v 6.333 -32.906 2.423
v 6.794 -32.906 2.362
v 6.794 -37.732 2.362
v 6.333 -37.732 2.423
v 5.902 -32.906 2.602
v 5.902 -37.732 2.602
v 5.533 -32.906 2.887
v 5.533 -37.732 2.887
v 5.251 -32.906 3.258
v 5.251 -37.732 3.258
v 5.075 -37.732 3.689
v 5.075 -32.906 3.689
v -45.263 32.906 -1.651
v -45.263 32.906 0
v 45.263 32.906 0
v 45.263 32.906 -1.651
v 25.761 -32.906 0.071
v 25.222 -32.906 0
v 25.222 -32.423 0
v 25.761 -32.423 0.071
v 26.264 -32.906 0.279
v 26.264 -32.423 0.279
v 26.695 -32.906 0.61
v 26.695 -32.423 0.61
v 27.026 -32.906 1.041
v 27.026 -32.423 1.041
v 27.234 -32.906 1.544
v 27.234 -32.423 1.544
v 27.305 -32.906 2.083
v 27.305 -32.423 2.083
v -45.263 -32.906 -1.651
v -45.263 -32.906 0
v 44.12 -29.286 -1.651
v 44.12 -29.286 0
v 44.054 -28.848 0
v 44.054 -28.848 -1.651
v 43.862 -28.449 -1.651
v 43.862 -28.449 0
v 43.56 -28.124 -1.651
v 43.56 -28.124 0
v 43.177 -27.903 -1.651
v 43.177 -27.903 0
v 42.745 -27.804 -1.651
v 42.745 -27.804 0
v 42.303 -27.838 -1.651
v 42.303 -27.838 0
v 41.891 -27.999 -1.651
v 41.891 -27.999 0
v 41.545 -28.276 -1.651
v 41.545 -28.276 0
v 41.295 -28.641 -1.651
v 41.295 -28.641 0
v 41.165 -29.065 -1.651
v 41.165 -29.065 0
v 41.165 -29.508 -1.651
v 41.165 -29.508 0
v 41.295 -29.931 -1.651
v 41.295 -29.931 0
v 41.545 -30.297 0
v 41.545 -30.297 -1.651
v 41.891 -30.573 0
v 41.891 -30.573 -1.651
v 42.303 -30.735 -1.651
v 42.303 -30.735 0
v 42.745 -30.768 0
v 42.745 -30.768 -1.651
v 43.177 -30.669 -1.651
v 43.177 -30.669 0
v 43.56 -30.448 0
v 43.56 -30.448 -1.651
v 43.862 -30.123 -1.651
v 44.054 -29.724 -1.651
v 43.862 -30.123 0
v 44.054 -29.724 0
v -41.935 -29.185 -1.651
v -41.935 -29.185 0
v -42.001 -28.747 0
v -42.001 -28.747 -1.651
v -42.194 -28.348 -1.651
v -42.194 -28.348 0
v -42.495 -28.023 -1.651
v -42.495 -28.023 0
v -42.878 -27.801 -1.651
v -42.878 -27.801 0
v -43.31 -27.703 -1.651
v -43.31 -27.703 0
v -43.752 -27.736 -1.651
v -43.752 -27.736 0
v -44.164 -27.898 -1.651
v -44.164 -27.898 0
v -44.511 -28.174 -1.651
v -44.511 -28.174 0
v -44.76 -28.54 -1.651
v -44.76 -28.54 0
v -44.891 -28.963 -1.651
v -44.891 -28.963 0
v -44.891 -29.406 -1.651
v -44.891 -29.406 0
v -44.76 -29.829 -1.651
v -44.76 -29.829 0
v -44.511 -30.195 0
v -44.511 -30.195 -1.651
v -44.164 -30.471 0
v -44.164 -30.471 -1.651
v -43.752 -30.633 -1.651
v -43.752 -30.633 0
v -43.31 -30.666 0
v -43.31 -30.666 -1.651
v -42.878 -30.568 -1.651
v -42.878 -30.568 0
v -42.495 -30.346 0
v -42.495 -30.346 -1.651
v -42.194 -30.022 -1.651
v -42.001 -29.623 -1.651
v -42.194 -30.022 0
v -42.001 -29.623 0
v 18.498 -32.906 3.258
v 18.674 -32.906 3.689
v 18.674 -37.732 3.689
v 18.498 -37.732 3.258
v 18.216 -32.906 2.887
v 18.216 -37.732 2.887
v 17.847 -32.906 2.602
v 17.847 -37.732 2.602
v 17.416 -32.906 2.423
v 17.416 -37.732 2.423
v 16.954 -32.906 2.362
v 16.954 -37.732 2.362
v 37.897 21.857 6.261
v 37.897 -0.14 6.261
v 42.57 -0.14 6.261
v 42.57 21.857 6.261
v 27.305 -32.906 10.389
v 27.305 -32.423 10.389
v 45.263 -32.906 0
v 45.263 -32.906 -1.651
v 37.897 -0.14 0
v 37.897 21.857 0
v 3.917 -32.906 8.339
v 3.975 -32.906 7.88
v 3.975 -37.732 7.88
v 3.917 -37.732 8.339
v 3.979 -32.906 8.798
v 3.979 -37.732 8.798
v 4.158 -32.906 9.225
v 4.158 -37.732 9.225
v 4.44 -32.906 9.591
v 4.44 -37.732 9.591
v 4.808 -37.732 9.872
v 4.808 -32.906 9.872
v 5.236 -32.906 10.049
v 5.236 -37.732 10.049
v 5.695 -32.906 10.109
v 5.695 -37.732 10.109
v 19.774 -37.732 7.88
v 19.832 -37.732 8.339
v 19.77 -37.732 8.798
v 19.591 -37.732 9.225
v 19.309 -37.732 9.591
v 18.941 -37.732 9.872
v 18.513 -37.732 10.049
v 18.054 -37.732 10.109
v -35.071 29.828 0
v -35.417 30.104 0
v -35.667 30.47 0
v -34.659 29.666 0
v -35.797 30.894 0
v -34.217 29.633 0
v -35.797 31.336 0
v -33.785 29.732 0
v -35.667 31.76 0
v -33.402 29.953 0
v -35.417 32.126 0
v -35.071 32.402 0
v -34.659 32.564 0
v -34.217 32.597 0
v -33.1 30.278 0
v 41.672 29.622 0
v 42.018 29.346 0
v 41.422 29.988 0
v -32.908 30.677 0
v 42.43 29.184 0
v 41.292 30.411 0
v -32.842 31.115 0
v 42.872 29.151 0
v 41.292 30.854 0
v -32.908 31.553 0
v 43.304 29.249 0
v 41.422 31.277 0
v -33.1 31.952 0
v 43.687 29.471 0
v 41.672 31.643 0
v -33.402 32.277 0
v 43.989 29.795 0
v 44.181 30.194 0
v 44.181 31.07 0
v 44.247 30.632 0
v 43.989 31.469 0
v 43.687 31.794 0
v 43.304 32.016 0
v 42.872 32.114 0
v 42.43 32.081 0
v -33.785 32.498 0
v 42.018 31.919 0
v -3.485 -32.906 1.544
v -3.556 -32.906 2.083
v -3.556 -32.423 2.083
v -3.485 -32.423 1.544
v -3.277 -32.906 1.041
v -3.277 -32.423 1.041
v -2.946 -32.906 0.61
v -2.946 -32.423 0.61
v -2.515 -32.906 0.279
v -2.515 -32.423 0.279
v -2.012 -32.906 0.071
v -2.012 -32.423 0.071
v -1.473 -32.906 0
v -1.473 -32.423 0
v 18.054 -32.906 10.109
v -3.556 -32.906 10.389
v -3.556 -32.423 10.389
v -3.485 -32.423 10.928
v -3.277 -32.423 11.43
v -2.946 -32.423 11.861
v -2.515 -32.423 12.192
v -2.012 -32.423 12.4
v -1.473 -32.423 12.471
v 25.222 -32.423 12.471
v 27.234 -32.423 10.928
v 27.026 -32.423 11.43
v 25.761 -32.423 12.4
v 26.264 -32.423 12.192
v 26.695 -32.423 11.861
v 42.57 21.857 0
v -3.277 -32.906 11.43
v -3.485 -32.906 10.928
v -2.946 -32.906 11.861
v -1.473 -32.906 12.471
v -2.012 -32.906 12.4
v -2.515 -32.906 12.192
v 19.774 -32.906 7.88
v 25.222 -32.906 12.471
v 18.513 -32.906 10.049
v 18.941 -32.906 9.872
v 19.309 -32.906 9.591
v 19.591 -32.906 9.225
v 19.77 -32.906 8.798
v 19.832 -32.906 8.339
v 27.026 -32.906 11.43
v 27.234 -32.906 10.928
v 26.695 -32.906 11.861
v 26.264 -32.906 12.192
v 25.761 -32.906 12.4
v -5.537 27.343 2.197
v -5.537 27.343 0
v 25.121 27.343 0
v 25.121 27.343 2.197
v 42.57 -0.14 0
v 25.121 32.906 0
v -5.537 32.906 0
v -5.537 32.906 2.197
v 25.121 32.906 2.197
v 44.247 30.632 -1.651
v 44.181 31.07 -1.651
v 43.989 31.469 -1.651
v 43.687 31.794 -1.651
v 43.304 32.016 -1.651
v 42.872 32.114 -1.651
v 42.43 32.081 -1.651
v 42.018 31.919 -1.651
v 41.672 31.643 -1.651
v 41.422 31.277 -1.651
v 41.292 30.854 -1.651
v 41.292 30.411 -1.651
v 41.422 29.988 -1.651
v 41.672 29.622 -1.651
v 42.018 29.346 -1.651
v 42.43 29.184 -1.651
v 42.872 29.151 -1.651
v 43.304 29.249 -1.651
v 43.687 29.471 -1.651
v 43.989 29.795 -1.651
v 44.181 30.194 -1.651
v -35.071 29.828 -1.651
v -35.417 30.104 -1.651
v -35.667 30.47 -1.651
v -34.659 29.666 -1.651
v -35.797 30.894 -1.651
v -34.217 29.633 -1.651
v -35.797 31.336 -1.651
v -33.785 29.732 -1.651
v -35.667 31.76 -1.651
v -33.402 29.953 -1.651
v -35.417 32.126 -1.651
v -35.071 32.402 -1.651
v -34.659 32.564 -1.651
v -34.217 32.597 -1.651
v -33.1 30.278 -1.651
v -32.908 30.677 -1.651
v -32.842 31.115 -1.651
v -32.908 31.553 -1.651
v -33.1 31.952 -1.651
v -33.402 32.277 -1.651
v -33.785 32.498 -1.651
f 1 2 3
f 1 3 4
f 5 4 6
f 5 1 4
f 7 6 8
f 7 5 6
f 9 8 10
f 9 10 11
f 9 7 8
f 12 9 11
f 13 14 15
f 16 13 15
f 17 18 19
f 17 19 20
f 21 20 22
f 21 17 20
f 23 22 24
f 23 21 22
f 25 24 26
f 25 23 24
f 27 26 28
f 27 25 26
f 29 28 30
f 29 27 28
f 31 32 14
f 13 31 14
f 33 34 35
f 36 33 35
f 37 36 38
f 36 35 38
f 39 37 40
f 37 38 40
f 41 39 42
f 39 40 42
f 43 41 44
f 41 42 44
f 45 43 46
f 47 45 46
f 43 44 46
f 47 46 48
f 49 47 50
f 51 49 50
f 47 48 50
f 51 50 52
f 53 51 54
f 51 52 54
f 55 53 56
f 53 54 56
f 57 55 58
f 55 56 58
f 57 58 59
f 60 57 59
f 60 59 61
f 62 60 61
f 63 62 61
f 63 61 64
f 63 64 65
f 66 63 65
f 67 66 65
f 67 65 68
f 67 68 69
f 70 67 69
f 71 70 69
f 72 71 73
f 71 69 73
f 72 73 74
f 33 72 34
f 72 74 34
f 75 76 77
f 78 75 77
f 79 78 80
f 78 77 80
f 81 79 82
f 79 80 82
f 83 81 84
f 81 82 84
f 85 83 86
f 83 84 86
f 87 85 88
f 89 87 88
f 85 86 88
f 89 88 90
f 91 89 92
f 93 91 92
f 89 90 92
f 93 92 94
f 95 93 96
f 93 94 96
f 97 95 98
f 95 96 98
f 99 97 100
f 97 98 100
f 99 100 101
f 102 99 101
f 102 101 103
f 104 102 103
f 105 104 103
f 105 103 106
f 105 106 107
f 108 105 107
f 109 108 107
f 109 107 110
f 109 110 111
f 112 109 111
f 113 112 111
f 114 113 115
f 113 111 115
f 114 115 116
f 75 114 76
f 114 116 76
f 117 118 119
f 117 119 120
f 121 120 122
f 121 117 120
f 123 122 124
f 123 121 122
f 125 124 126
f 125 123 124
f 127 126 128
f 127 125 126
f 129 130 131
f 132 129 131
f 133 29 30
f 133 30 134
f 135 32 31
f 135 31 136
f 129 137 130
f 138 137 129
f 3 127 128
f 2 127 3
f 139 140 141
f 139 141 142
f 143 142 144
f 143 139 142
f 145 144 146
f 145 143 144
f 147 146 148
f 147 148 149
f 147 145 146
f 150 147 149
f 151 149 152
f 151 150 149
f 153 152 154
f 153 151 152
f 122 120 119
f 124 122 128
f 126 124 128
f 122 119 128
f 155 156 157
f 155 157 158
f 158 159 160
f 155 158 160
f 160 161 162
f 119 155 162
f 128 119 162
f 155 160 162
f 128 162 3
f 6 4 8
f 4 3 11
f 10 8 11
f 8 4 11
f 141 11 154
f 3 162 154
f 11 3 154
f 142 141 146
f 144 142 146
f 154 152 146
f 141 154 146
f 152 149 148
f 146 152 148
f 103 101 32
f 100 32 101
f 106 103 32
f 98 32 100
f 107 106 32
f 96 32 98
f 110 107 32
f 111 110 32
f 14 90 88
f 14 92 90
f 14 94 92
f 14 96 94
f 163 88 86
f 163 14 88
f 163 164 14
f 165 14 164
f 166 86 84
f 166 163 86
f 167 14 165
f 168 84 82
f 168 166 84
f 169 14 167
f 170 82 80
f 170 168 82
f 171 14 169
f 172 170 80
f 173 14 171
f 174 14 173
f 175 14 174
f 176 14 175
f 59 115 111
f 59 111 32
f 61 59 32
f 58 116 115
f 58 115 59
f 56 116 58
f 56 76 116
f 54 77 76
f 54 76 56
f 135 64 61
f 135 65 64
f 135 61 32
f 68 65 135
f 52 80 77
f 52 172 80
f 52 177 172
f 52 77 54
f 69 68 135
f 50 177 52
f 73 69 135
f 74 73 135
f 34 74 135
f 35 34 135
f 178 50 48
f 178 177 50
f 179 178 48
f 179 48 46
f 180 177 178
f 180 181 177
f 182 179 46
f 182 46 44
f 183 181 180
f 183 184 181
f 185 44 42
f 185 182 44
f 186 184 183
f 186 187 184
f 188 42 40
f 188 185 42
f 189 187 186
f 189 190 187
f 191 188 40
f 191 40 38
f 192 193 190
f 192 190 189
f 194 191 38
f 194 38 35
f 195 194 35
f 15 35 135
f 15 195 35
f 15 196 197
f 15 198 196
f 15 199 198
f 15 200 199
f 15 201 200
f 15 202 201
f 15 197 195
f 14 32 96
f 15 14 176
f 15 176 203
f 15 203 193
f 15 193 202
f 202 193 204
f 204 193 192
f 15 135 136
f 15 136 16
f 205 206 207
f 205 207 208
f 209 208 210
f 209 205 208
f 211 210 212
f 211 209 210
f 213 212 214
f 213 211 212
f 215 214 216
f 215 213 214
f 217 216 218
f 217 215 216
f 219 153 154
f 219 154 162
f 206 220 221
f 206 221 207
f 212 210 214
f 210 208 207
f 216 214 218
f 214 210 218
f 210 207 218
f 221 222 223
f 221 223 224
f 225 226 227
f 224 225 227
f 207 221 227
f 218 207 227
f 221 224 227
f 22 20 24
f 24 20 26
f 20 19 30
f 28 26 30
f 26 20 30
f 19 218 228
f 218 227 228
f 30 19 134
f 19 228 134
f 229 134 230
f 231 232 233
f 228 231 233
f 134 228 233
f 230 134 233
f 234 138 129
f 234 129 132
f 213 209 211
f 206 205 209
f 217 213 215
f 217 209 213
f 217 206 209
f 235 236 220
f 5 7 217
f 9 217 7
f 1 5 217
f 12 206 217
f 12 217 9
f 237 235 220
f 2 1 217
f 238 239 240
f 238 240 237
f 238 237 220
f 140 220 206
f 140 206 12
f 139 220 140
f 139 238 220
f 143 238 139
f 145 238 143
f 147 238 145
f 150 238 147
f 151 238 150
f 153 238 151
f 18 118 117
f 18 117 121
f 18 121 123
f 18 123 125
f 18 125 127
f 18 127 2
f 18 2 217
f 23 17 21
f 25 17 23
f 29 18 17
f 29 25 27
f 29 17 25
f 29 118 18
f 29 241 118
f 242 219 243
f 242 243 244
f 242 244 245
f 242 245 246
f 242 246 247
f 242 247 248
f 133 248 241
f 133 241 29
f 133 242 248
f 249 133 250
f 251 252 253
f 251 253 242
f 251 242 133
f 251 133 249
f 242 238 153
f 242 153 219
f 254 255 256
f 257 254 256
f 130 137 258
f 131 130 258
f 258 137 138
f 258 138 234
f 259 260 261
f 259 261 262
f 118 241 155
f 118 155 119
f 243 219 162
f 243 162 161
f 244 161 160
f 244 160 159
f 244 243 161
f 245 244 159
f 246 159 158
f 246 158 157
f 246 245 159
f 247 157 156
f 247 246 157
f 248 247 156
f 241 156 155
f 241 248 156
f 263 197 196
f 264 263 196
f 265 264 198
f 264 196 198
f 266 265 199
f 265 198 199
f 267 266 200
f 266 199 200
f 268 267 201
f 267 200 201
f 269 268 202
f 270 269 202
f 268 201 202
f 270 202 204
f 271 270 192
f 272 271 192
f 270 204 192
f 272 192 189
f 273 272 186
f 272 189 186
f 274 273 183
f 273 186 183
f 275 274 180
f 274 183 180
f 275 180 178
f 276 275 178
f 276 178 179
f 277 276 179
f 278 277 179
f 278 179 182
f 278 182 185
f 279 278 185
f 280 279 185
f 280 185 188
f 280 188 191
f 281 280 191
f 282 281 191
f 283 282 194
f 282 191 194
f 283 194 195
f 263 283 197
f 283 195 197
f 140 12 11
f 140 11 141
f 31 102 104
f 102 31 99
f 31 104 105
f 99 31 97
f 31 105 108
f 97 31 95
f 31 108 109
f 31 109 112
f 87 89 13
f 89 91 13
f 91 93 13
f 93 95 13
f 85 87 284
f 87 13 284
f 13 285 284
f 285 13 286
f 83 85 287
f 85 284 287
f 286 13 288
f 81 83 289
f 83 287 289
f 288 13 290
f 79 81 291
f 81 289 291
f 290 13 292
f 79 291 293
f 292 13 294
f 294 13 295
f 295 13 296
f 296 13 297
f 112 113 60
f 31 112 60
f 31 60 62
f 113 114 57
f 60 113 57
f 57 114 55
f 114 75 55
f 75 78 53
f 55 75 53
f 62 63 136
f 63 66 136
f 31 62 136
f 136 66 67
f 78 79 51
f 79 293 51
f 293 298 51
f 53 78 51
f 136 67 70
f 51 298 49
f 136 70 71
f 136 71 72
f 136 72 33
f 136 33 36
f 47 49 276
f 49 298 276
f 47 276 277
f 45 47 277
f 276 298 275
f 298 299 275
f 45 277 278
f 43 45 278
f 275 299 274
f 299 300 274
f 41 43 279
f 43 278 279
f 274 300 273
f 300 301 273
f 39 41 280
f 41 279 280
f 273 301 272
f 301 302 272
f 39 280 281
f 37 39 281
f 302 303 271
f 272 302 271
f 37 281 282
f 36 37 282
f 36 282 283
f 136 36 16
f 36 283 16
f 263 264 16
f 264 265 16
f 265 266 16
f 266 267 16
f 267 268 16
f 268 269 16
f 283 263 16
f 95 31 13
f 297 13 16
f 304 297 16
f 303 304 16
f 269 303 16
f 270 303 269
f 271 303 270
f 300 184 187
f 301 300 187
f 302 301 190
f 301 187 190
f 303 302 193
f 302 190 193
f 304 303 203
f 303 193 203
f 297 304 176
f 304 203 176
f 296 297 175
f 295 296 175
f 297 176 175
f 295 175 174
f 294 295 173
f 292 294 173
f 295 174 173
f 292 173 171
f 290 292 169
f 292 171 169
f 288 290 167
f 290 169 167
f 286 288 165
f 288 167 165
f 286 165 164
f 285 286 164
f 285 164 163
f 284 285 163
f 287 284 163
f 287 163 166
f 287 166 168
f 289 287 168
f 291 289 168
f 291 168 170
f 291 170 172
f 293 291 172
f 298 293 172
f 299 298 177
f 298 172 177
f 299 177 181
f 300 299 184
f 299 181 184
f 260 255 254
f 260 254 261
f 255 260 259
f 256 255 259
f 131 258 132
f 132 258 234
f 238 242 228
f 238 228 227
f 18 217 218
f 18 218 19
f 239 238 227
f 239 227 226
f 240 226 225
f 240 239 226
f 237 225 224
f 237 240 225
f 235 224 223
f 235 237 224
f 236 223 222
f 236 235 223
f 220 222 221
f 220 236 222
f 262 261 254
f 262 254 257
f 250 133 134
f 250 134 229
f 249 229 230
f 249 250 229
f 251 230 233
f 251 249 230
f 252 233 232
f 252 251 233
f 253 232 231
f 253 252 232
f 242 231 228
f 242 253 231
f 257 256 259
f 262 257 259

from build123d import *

# Parameters (mm, degrees)
SKETCH1_W           = 90.5256
SKETCH1_H           = 65.8114
SKETCH1_R           = 1.4859
BOSS_EXTRUDE1_DEPTH = 1.651
BOSS_EXTRUDE2_DEPTH = 0.4826
BOSS_EXTRUDE3_DEPTH = 4.826
SKETCH4_W           = 30.6578
SKETCH4_H           = 5.5626
BOSS_EXTRUDE4_DEPTH = 2.1971
SKETCH5_W           = 4.6736
SKETCH5_H           = 21.9964
BOSS_EXTRUDE5_DEPTH = 6.2611


with BuildPart() as part:
    # Sketch1 → Boss-Extrude1 (new body)
    with BuildSketch(Plane.XY):
        Rectangle(SKETCH1_W, SKETCH1_H)
        with Locations((-34.3281, 31.115)):
            Circle(SKETCH1_R, mode=Mode.SUBTRACT)
        with Locations((-43.4213, -29.1846)):
            Circle(SKETCH1_R, mode=Mode.SUBTRACT)
        with Locations((42.7609, 30.6324)):
            Circle(SKETCH1_R, mode=Mode.SUBTRACT)
        with Locations((42.6339, -29.2862)):
            Circle(SKETCH1_R, mode=Mode.SUBTRACT)
    extrude(amount=-BOSS_EXTRUDE1_DEPTH)


with BuildPart() as body_2:
    # Sketch2 → Boss-Extrude2 (new body)
    with BuildSketch(Plane.XZ.offset(32.9057)):
        with BuildLine():
            Line((-1.4732, 0), (25.2222, 0))
            ThreePointArc((25.2222, 0), (26.694962004, 0.610037996), (27.305, 2.0828))
            Line((27.305, 2.0828), (27.305, 10.3886))
            ThreePointArc((27.305, 10.3886), (26.694962004, 11.861362004), (25.2222, 12.4714))
            Line((25.2222, 12.4714), (-1.4732, 12.4714))
            ThreePointArc((-1.4732, 12.4714), (-2.945962004, 11.861362004), (-3.556, 10.3886))
            Line((-3.556, 10.3886), (-3.556, 2.0828))
            ThreePointArc((-3.556, 2.0828), (-2.945962004, 0.610037996), (-1.4732, 0))
        make_face()
    extrude(amount=-BOSS_EXTRUDE2_DEPTH)

    # Sketch3 → Boss-Extrude3 (add)
    with BuildSketch(Plane.XZ.offset(32.9057)):
        with BuildLine():
            Line((5.694889781, 10.1092), (18.054110219, 10.1092))
            ThreePointArc((18.054110219, 10.1092), (19.461868753, 9.41724784), (19.7739, 7.879971554))
            Line((19.7739, 7.879971554), (18.674289781, 3.688971554))
            ThreePointArc((18.674289781, 3.688971554), (18.04054784, 2.732441466), (16.9545, 2.3622))
            Line((16.9545, 2.3622), (6.7945, 2.3622))
            ThreePointArc((6.7945, 2.3622), (5.70845216, 2.732441466), (5.074710219, 3.688971554))
            Line((5.074710219, 3.688971554), (3.9751, 7.879971554))
            ThreePointArc((3.9751, 7.879971554), (4.287131247, 9.41724784), (5.694889781, 10.1092))
        make_face()
    extrude(amount=BOSS_EXTRUDE3_DEPTH)


with BuildPart() as body_3:
    # Sketch4 → Boss-Extrude4 (new body)
    with BuildSketch(Plane.XY):
        with Locations((9.7917, 30.1244)):
            Rectangle(SKETCH4_W, SKETCH4_H)
    extrude(amount=BOSS_EXTRUDE4_DEPTH)


with BuildPart() as body_4:
    # Sketch5 → Boss-Extrude5 (new body)
    with BuildSketch(Plane.XY):
        with Locations((40.2336, 10.8585)):
            Rectangle(SKETCH5_W, SKETCH5_H)
    extrude(amount=BOSS_EXTRUDE5_DEPTH)


solid = Compound([part.part, body_2.part, body_3.part, body_4.part])
